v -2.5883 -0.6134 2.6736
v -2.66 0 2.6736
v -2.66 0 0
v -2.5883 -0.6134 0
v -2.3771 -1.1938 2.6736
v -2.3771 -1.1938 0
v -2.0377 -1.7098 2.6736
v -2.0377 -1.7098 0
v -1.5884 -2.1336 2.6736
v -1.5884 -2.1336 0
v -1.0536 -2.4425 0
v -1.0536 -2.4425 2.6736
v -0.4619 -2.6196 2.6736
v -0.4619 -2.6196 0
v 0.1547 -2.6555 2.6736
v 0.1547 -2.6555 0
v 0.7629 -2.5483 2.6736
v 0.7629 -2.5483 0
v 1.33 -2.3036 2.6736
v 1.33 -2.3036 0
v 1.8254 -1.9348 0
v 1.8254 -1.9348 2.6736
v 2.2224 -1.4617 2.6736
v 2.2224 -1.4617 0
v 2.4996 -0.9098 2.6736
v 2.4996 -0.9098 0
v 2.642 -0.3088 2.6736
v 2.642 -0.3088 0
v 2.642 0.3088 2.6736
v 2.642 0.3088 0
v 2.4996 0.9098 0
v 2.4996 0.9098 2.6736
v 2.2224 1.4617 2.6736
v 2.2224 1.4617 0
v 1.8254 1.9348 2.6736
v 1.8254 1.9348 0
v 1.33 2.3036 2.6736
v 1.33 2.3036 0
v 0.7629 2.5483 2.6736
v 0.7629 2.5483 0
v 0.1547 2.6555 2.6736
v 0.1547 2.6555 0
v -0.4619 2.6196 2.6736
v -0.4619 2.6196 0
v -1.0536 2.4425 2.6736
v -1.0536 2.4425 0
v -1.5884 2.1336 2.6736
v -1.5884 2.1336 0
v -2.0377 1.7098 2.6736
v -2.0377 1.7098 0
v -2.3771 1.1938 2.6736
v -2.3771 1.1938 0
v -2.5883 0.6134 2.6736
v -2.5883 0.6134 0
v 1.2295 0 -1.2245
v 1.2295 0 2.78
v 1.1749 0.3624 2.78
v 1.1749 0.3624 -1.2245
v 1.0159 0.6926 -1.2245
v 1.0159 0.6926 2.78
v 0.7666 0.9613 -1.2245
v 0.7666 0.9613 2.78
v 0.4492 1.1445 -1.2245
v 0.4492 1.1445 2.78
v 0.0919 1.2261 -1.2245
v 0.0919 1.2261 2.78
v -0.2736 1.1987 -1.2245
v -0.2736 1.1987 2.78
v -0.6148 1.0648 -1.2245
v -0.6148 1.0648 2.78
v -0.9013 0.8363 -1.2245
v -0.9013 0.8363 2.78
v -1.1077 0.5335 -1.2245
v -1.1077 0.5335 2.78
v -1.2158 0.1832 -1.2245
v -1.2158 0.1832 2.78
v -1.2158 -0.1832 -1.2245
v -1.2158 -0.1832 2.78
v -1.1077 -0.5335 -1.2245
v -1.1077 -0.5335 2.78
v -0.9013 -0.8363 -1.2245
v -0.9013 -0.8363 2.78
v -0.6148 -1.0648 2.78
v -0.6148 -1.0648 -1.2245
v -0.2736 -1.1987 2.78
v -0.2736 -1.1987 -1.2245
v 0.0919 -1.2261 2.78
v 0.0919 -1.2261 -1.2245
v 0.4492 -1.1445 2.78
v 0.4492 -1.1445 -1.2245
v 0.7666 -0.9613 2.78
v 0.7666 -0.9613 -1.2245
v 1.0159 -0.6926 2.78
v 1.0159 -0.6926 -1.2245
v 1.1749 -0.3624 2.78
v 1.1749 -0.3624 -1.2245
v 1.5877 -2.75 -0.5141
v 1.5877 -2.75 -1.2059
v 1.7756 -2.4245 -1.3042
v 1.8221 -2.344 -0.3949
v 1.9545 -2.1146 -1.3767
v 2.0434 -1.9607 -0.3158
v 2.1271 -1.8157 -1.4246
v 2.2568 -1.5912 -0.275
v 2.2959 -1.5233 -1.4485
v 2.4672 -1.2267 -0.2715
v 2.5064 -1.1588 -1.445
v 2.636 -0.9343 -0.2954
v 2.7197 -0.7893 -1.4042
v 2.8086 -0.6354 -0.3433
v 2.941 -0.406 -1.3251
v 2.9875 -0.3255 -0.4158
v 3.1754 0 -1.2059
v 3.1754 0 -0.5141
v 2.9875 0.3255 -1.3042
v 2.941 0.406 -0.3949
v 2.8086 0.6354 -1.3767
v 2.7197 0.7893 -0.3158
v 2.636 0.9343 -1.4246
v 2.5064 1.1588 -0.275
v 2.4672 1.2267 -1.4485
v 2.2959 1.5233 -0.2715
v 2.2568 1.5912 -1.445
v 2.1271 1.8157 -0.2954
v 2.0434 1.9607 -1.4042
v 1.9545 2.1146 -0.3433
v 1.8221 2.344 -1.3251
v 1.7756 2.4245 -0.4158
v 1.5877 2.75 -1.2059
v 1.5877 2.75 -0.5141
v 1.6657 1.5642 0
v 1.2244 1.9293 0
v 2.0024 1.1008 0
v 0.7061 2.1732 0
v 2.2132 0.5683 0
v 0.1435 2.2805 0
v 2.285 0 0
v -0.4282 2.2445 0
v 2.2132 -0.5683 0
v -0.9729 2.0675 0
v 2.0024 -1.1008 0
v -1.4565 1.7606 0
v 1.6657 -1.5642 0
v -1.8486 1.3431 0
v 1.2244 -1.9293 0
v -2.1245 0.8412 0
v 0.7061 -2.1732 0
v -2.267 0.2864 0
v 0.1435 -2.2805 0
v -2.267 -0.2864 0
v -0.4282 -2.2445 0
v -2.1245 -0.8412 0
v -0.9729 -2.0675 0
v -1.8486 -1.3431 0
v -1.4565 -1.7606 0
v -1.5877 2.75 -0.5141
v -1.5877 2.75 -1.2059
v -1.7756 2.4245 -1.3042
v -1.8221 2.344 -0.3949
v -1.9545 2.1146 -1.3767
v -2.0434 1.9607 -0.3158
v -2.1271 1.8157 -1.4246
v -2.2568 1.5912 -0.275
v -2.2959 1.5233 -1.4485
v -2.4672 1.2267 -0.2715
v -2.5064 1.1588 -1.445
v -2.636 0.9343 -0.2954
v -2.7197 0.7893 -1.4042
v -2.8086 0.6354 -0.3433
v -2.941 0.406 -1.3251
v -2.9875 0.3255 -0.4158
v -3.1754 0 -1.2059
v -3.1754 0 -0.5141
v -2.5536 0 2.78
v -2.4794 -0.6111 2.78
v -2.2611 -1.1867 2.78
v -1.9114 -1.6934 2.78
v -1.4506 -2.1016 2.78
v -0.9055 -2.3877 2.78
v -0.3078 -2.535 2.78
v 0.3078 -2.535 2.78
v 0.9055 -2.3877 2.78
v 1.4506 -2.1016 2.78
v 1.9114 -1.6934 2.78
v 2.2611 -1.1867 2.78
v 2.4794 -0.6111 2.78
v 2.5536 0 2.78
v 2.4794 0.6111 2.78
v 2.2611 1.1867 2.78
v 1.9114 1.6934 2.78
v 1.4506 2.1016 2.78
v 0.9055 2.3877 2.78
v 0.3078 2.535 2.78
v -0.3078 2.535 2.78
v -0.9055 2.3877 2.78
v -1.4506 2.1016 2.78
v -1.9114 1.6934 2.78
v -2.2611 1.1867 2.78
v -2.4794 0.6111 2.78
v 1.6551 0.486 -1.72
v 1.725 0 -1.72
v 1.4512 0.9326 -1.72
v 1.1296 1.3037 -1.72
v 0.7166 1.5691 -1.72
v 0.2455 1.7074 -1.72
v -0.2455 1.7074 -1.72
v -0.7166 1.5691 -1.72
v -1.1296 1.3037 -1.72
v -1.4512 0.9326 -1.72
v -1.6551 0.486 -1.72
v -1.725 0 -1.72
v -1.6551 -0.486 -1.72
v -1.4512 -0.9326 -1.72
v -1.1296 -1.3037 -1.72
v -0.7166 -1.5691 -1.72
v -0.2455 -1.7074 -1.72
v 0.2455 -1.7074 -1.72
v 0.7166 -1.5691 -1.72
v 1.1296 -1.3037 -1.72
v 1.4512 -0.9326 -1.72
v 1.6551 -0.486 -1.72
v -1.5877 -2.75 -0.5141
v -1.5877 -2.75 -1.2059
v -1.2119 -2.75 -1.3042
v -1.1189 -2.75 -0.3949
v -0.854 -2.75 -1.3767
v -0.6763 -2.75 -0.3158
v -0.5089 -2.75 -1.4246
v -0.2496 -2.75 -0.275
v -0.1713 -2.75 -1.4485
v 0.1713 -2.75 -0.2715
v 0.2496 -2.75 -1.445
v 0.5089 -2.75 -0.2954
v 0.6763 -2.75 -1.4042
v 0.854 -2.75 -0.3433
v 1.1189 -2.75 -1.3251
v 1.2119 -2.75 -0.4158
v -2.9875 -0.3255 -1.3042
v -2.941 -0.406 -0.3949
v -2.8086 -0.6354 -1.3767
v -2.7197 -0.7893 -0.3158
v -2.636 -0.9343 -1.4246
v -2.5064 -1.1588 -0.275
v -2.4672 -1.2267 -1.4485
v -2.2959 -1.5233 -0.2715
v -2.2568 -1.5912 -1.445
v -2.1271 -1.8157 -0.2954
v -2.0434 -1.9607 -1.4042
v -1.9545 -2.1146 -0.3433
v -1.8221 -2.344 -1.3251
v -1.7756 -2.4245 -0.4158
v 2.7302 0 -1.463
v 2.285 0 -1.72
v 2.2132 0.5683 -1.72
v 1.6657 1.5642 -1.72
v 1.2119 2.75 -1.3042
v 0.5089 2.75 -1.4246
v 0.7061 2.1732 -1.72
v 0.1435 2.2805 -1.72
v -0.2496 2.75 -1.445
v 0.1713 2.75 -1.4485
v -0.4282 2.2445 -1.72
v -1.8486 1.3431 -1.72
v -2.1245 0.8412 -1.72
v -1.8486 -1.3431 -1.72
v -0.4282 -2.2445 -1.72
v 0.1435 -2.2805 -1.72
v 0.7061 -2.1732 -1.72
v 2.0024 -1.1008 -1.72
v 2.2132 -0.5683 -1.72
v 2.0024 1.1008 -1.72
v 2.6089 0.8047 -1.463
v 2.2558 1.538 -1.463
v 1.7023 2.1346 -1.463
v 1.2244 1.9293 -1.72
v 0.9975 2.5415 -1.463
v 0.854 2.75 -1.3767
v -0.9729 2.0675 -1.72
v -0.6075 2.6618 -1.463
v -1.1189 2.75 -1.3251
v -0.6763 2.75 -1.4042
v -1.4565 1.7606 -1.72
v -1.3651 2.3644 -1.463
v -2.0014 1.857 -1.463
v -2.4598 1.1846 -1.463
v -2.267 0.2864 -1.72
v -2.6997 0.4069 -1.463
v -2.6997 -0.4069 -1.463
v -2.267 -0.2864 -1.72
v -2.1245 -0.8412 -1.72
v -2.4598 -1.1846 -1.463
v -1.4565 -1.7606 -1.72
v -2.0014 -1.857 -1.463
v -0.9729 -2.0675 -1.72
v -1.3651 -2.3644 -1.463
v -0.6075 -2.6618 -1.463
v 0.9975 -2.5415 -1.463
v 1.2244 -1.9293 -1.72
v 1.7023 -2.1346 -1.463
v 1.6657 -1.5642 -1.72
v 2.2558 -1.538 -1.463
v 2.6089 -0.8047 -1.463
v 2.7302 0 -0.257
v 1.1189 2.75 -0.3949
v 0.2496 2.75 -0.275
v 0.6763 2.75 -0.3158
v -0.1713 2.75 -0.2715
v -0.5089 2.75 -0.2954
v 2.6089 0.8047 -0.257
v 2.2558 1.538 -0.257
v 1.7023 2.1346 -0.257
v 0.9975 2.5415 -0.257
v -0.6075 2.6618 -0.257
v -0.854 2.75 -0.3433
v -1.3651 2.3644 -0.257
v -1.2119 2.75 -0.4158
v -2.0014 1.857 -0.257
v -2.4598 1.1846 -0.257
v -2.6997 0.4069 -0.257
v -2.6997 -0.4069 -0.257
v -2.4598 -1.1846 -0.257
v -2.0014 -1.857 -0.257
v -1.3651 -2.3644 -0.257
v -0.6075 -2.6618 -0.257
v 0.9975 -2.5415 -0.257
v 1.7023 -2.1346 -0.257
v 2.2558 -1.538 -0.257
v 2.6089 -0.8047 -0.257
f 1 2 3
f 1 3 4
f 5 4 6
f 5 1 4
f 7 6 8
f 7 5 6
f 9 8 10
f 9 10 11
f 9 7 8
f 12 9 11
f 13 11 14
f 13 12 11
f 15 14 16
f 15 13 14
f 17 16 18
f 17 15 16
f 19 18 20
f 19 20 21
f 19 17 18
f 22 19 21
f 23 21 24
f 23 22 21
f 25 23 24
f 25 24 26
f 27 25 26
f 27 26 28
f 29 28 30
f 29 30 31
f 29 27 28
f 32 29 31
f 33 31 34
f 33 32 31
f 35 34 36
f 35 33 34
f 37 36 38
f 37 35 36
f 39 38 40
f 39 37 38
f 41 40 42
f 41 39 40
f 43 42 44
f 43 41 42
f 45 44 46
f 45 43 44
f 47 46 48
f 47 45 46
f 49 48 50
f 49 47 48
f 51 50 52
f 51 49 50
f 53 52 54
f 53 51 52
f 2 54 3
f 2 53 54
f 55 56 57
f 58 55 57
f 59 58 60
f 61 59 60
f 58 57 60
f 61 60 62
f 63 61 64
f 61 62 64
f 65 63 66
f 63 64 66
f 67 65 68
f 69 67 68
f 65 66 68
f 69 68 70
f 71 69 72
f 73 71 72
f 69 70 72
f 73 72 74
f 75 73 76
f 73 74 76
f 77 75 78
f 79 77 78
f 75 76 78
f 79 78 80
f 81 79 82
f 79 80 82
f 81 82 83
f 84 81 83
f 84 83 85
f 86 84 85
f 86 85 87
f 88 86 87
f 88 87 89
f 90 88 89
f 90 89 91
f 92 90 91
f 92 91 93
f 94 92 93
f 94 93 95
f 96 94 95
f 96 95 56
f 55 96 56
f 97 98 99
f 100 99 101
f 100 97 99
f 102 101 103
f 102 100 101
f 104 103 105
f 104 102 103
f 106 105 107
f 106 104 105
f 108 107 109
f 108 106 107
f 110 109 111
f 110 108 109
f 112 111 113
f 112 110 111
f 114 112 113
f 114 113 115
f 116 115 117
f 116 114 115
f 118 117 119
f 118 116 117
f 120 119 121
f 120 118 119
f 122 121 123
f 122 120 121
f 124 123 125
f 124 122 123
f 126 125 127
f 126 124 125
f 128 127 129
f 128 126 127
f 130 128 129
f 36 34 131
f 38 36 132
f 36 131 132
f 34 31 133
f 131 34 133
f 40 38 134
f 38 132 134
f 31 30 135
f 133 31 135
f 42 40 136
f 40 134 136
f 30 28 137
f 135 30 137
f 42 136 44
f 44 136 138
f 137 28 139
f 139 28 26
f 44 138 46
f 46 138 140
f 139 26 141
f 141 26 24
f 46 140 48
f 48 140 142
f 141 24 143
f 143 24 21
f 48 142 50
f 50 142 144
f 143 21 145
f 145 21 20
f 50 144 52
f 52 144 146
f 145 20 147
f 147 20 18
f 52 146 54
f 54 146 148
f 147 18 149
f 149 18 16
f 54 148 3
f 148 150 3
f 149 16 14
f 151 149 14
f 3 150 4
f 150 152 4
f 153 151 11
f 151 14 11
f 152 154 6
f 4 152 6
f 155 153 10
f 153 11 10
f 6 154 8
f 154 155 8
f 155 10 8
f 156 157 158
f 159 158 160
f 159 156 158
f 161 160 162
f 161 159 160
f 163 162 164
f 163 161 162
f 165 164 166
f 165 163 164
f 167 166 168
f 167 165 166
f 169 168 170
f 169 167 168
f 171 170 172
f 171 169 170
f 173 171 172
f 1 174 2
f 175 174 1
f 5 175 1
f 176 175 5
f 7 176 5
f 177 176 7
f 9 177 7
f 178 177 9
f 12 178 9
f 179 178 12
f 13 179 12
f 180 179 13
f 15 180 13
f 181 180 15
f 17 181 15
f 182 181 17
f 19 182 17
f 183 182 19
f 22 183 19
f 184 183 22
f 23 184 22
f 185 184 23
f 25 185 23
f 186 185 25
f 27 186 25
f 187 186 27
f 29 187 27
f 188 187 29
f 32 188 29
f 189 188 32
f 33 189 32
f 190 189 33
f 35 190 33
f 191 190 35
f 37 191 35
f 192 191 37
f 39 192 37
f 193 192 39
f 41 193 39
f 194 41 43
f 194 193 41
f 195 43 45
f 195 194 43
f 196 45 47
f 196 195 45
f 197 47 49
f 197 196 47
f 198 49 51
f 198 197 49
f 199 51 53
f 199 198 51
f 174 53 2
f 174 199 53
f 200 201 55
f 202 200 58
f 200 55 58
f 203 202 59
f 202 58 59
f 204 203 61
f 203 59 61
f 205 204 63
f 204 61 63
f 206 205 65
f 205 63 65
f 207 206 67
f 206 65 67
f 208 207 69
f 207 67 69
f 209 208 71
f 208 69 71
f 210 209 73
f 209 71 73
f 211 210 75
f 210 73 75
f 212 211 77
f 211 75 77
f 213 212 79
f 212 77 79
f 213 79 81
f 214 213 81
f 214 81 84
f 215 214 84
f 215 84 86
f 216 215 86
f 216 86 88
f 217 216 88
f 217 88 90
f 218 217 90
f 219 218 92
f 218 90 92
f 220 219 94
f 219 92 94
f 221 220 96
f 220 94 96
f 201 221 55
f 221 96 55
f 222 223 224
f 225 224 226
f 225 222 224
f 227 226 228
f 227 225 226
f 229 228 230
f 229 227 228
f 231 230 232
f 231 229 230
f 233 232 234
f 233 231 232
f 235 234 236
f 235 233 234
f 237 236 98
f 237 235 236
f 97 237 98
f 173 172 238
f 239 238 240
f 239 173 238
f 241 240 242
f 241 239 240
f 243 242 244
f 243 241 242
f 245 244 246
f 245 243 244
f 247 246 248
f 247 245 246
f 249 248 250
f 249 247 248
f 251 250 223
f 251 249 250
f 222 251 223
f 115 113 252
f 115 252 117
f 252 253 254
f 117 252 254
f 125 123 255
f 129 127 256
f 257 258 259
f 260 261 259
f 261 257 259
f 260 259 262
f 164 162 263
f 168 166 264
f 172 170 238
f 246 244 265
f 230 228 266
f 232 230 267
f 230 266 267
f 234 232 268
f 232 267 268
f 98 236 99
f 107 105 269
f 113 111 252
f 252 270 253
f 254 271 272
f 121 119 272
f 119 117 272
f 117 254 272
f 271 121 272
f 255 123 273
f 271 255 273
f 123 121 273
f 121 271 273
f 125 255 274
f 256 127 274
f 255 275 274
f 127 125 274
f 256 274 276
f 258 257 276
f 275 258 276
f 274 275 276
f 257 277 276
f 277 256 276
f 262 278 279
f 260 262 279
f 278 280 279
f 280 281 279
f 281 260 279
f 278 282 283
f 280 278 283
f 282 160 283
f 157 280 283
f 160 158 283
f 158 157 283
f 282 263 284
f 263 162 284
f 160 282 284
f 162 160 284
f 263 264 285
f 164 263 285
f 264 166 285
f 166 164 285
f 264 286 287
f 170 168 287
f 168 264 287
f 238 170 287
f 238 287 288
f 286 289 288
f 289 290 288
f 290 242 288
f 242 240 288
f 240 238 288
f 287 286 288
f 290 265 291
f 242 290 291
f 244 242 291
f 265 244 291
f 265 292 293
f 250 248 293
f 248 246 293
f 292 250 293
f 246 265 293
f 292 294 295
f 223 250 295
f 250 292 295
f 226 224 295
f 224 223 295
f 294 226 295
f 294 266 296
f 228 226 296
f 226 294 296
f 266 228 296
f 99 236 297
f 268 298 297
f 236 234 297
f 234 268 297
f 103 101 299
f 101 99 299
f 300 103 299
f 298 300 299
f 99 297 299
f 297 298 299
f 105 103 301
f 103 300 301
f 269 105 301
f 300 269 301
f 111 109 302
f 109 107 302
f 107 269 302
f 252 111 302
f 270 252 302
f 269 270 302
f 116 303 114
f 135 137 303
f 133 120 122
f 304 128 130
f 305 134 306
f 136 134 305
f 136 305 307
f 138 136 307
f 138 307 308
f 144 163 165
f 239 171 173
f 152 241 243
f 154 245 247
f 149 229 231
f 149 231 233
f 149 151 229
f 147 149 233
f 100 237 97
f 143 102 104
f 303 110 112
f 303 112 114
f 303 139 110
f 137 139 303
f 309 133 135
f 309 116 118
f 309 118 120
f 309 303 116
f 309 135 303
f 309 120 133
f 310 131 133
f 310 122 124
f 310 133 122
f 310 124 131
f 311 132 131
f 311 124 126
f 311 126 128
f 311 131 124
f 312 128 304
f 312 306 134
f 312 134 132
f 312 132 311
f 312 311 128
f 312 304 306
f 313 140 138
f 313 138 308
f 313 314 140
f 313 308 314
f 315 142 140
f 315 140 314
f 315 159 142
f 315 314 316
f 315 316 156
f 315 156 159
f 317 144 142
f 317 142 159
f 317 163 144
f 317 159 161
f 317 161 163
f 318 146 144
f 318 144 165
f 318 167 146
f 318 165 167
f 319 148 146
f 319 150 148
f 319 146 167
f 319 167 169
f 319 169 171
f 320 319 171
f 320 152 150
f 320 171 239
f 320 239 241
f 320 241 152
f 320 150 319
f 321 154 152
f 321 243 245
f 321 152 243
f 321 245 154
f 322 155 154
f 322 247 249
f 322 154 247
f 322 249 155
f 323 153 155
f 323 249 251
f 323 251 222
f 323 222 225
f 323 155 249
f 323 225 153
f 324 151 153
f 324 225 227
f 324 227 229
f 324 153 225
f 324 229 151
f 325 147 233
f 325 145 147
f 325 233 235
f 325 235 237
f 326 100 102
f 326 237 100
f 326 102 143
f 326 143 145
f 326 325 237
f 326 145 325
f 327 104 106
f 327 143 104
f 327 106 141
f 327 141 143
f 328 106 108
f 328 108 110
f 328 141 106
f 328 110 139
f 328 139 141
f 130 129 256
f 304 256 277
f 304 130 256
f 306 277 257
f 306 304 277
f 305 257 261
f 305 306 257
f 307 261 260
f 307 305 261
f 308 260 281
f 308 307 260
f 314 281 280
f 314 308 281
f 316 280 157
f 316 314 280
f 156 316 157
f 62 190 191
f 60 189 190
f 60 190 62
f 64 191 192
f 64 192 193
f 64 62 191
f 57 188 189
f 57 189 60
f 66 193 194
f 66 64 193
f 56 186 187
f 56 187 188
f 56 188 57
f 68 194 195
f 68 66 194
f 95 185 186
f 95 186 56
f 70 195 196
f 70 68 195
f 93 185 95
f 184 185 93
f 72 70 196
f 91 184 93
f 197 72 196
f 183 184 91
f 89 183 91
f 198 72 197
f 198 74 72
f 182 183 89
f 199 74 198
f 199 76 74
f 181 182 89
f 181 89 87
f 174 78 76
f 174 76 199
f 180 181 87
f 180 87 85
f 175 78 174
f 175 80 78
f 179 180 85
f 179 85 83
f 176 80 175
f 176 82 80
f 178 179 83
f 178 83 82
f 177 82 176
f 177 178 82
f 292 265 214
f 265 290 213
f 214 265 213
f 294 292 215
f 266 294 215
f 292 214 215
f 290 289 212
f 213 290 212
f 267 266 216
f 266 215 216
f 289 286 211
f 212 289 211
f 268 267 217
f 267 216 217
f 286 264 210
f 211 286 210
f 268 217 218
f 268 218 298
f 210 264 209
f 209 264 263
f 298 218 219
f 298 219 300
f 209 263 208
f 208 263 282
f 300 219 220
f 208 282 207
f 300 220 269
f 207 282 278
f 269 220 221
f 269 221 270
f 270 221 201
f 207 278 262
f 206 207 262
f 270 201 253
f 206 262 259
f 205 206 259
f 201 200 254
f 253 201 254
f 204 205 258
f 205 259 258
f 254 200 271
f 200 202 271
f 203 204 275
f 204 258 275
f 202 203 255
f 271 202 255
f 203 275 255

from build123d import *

# Parameters (mm, degrees)
SKETCH1_R      = 1.2295
BASENUT_DEPTH  = 1.72
EXTRUDE1_START = 2.78
SKETCH2_R      = 2.66
SKETCH2_R_2    = 1.2295
EXTRUDE1_DEPTH = 2.78
CHAMFER1_SIZE  = 0.1064


with BuildPart() as part:
    # Sketch1 → BaseNut (new body)
    with BuildSketch(Plane.XY):
        Polygon((1.58771324, -2.75), (3.175426481, 0), (1.58771324, 2.75), (-1.58771324, 2.75), (-3.175426481, 0), (-1.58771324, -2.75), align=None)
        Circle(SKETCH1_R, mode=Mode.SUBTRACT)
    extrude(amount=-BASENUT_DEPTH)

    # Sketch3 → Double-Chamfer (revolve, cut)
    with BuildSketch(Plane(origin=(0, 0, 0), x_dir=(1, 0, 0), z_dir=(0, 1, 0))):
        Polygon((2.285, 1.72), (3.175426481, 1.72), (3.175426481, 1.205912032), align=None)
        Polygon((3.175426481, 0.514087968), (2.285, 0), (3.175426481, 0), align=None)
    revolve(axis=Axis((0, 0, -16.31077227), (0, 0, 1)), mode=Mode.SUBTRACT)

    # Sketch2 → Extrude1 (add)
    with BuildSketch(Plane(origin=(20.087129569, -4.281493882, 0), x_dir=(1, 0, 0), z_dir=(0, 0, 1)).offset(EXTRUDE1_START)):
        with Locations(Location((-20.087129569, 4.281493882, 0), (0, 0, 180))):
            Circle(SKETCH2_R)
        with Locations((-20.087129569, 4.281493882)):
            Circle(SKETCH2_R_2, mode=Mode.SUBTRACT)
    extrude(amount=-EXTRUDE1_DEPTH)

    # Sketch5 → EndChamfer (revolve, cut)
    with BuildSketch(Plane(origin=(0, 0, 0), x_dir=(1, 0, 0), z_dir=(0, 1, 0))):
        Polygon((1.2295, 1.72), (1.725, 1.72), (1.2295, 1.2245), align=None)
    revolve(axis=Axis((0, 0, -16.800797033), (0, 0, 1)), mode=Mode.SUBTRACT)

    # Chamfer1
    chamfer1_edges = [part.edges().sort_by_distance(p)[0] for p in [
        (2.66, 0, 2.78),
    ]]
    chamfer(chamfer1_edges, length=CHAMFER1_SIZE)


solid = part.part
